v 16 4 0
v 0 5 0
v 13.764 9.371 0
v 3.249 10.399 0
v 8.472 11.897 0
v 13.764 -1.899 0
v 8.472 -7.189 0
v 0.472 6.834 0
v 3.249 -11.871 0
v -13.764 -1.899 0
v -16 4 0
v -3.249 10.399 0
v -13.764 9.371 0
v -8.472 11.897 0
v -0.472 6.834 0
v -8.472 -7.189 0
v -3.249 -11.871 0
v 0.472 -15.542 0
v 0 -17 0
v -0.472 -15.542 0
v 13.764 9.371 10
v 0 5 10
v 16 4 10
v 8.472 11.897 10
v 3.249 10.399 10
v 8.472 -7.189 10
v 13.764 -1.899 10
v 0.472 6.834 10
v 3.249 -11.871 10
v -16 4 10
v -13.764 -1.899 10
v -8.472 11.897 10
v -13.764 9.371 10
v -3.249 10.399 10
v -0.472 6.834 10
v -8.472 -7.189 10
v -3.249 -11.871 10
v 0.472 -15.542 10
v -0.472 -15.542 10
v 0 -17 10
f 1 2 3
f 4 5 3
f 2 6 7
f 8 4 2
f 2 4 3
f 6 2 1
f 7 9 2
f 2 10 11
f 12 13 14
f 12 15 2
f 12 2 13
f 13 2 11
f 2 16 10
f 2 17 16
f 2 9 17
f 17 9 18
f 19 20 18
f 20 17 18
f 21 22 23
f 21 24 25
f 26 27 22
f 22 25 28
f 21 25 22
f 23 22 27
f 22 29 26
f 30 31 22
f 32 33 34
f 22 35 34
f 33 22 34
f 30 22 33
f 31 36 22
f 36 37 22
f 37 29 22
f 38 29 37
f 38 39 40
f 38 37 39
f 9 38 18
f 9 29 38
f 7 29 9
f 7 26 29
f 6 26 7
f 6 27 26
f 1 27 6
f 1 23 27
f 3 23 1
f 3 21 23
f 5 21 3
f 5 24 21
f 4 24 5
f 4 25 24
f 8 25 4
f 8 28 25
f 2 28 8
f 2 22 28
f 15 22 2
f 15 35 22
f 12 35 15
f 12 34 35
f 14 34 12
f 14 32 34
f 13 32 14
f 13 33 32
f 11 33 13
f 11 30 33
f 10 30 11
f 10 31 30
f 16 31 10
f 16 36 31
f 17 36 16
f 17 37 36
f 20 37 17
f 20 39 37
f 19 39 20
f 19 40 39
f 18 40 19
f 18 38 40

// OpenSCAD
n = 20;
h = 10;
step = 360/n;
points = [ for (t=[0:step:359.999]) [16*pow(sin(t),3), 13*cos(t) - 5*cos(2*t) - 2*cos(3*t) - cos(4*t)]];
linear_extrude(height=h)
    polygon(points);
